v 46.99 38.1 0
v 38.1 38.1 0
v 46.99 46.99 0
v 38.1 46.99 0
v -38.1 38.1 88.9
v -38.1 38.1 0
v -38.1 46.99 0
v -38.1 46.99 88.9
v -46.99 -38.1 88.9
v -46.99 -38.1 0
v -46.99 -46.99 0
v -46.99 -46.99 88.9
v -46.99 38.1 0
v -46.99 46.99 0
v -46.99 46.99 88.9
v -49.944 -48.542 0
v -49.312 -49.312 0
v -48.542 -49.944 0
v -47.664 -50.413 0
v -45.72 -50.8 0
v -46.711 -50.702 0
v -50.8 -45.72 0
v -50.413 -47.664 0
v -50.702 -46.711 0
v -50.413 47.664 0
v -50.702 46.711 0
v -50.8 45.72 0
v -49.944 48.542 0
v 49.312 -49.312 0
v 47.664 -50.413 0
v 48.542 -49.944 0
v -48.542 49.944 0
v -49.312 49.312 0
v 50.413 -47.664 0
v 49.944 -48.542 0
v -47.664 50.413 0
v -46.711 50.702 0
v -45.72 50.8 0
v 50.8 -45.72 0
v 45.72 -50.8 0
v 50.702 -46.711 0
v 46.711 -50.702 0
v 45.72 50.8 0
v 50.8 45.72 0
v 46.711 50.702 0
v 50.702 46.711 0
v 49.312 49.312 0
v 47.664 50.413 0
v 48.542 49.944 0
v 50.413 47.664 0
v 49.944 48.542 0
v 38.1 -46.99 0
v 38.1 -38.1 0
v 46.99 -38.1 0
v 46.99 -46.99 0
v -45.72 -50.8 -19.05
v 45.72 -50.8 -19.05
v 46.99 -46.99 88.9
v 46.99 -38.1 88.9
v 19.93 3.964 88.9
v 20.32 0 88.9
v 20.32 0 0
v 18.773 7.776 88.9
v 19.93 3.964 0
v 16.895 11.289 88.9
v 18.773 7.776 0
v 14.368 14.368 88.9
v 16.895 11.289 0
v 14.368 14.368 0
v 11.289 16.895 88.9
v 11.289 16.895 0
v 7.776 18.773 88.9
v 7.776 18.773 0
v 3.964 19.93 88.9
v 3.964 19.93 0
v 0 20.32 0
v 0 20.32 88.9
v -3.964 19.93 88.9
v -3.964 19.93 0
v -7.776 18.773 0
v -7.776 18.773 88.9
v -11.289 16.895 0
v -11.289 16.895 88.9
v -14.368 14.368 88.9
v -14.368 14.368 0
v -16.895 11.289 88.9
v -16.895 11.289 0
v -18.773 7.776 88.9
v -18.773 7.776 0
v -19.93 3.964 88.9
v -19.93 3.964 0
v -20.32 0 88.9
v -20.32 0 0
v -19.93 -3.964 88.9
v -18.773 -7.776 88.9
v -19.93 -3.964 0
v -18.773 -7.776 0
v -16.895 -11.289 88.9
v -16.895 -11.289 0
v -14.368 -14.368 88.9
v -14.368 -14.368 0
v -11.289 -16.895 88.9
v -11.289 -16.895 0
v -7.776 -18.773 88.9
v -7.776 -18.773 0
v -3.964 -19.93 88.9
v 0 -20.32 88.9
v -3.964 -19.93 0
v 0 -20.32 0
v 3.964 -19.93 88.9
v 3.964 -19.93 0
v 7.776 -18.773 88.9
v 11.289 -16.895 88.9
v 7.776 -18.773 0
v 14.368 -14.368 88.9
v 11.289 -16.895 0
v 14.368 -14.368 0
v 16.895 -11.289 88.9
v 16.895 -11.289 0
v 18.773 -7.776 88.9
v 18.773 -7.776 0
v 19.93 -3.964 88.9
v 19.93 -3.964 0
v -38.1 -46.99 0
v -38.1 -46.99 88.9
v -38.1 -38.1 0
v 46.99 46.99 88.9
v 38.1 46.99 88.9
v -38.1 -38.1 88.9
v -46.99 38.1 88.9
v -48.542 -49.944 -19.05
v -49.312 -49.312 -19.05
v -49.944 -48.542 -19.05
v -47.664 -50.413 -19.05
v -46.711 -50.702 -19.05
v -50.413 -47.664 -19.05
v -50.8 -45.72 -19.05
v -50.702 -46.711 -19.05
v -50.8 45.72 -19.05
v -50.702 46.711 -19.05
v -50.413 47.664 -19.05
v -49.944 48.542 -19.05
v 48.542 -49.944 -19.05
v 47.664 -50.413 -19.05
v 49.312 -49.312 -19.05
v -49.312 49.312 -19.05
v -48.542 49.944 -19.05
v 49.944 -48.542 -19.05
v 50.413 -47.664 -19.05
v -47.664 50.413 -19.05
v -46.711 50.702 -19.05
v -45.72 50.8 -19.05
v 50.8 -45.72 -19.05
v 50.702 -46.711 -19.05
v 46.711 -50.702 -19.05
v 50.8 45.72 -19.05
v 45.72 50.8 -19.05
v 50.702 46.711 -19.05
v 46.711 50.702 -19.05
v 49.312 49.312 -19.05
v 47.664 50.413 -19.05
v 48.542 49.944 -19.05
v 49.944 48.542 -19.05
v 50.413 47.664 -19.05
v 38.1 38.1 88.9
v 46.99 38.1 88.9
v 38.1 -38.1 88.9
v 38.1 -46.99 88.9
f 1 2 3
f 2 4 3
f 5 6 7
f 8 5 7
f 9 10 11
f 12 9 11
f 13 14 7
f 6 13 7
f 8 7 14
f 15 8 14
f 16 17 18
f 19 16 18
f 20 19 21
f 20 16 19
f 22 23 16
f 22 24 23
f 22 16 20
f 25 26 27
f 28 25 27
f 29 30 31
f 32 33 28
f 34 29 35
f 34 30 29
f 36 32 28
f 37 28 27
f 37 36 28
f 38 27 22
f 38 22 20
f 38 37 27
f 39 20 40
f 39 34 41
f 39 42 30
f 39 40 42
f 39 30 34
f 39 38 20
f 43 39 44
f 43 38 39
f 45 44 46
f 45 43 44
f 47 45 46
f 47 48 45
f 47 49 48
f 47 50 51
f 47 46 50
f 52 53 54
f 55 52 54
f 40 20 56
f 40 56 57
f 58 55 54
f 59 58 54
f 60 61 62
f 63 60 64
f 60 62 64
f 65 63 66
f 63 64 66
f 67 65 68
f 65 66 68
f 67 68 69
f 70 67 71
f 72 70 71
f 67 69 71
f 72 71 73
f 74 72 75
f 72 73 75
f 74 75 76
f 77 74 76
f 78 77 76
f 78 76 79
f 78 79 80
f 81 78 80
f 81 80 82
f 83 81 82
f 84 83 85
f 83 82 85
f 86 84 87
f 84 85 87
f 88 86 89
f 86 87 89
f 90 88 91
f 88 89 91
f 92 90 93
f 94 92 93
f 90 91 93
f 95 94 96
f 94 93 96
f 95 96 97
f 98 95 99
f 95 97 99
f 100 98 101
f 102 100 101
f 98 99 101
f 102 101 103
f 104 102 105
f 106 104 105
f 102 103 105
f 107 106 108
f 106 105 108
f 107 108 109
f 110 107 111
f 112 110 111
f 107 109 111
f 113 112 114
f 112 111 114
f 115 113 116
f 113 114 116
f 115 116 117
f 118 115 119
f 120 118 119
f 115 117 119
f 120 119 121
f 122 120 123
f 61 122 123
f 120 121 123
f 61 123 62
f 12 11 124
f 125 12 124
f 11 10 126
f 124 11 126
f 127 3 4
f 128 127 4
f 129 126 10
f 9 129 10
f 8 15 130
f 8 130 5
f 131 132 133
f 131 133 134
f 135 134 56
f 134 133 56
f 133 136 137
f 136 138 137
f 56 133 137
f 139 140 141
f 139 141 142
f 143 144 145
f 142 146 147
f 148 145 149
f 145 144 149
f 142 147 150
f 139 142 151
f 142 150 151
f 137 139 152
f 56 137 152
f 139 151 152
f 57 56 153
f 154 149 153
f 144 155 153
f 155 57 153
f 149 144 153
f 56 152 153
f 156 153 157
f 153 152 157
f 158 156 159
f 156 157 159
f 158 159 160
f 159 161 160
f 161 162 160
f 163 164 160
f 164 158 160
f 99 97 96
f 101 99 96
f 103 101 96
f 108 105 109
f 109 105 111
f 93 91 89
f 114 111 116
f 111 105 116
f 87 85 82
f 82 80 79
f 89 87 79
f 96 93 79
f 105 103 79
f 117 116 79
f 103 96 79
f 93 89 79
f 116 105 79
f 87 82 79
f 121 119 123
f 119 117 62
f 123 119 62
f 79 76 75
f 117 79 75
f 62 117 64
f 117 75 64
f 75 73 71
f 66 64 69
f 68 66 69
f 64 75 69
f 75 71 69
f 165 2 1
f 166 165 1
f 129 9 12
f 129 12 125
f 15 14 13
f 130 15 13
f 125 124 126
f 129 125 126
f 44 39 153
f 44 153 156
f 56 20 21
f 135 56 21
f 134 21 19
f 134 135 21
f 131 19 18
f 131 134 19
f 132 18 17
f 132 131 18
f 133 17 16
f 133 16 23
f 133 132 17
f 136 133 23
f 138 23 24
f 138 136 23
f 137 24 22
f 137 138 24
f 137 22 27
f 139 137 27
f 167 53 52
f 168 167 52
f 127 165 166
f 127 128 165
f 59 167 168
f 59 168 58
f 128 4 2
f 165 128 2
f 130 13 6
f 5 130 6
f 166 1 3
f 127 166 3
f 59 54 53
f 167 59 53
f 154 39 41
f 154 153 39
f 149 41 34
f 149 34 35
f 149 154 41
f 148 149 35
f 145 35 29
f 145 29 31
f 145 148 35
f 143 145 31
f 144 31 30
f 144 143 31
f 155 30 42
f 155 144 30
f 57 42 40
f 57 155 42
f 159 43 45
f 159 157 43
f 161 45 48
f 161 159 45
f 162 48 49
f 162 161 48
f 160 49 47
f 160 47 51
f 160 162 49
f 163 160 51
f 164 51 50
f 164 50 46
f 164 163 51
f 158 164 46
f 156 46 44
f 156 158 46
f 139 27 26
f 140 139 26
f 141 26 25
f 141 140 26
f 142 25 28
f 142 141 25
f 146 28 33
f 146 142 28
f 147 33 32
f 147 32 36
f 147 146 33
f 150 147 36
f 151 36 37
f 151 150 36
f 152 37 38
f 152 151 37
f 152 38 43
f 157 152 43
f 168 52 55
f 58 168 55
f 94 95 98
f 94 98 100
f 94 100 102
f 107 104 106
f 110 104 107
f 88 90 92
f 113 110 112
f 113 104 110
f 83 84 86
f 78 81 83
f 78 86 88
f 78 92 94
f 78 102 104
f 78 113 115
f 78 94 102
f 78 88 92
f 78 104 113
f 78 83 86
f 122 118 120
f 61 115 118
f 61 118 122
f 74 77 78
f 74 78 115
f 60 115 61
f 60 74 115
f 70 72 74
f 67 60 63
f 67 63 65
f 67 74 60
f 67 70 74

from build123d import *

# Parameters (mm, degrees)
F0_W     = 101.6
F0_H     = 101.6
F1_DEPTH = 19.05
F3_DEPTH = 88.9
F4_R     = 20.32
F5_DEPTH = 88.9
F6_R     = 5.08
F7_R     = 5.08
F8_R     = 5.08
F9_R     = 5.08


# Not quite as in the source:
# - the program builds the solid bodies; features that only make, move or delete a surface that nothing else refers to are left out


with BuildPart() as f1:
    # F0 (on Top) → F1 (new body)
    with BuildSketch(Plane.XY):
        Rectangle(F0_W, F0_H)
    extrude(amount=-F1_DEPTH)

    # F6
    f6_edges = [f1.edges().sort_by_distance(p)[0] for p in [
        (-50.8, 50.8, -9.525),
    ]]
    fillet(f6_edges, radius=F6_R)

    # F7
    f7_edges = [f1.edges().sort_by_distance(p)[0] for p in [
        (50.8, 50.8, -9.525),
    ]]
    fillet(f7_edges, radius=F7_R)

    # F8
    f8_edges = [f1.edges().sort_by_distance(p)[0] for p in [
        (50.8, -50.8, -9.525),
    ]]
    fillet(f8_edges, radius=F8_R)

    # F9
    f9_edges = [f1.edges().sort_by_distance(p)[0] for p in [
        (-50.8, -50.8, -9.525),
    ]]
    fillet(f9_edges, radius=F9_R)


with BuildPart() as f3:
    # F2 (on face) → F3 (new body)
    with BuildSketch(Plane.XY):
        Polygon((42.291, -38.1), (38.1, -38.1), (38.1, -42.291), (38.1, -42.799), (38.1, -46.99), (46.99, -46.99), (46.99, -38.1), (42.799, -38.1), align=None)
    extrude(amount=F3_DEPTH)


with BuildPart() as f3b:
    # F2 (on face) → F3, piece 2 (new body)
    with BuildSketch(Plane.XY):
        Polygon((-38.1, -42.799), (-38.1, -42.291), (-38.1, -38.1), (-42.291, -38.1), (-42.799, -38.1), (-44.1724389358, -38.1), (-44.6804389358, -38.1), (-46.99, -38.1), (-46.99, -46.99), (-38.1, -46.99), align=None)
    extrude(amount=F3_DEPTH)


with BuildPart() as f3c:
    # F2 (on face) → F3, piece 3 (new body)
    with BuildSketch(Plane.XY):
        Polygon((-38.1, 38.1), (-38.1, 42.291), (-38.1, 42.799), (-38.1, 46.99), (-46.99, 46.99), (-46.99, 38.1), (-44.6804389358, 38.1), (-44.1724389358, 38.1), (-42.799, 38.1), (-42.291, 38.1), align=None)
    extrude(amount=F3_DEPTH)


with BuildPart() as f3d:
    # F2 (on face) → F3, piece 4 (new body)
    with BuildSketch(Plane.XY):
        Polygon((38.1, 38.1), (42.291, 38.1), (42.799, 38.1), (46.99, 38.1), (46.99, 46.99), (38.1, 46.99), (38.1, 42.799), (38.1, 42.291), align=None)
    extrude(amount=F3_DEPTH)


with BuildPart() as f5:
    # F4 (on face) → F5 (new body)
    with BuildSketch(Plane.XY):
        Circle(F4_R)
    extrude(amount=F5_DEPTH)


solid = Compound([f1.part, f3.part, f3b.part, f3c.part, f3d.part, f5.part])
